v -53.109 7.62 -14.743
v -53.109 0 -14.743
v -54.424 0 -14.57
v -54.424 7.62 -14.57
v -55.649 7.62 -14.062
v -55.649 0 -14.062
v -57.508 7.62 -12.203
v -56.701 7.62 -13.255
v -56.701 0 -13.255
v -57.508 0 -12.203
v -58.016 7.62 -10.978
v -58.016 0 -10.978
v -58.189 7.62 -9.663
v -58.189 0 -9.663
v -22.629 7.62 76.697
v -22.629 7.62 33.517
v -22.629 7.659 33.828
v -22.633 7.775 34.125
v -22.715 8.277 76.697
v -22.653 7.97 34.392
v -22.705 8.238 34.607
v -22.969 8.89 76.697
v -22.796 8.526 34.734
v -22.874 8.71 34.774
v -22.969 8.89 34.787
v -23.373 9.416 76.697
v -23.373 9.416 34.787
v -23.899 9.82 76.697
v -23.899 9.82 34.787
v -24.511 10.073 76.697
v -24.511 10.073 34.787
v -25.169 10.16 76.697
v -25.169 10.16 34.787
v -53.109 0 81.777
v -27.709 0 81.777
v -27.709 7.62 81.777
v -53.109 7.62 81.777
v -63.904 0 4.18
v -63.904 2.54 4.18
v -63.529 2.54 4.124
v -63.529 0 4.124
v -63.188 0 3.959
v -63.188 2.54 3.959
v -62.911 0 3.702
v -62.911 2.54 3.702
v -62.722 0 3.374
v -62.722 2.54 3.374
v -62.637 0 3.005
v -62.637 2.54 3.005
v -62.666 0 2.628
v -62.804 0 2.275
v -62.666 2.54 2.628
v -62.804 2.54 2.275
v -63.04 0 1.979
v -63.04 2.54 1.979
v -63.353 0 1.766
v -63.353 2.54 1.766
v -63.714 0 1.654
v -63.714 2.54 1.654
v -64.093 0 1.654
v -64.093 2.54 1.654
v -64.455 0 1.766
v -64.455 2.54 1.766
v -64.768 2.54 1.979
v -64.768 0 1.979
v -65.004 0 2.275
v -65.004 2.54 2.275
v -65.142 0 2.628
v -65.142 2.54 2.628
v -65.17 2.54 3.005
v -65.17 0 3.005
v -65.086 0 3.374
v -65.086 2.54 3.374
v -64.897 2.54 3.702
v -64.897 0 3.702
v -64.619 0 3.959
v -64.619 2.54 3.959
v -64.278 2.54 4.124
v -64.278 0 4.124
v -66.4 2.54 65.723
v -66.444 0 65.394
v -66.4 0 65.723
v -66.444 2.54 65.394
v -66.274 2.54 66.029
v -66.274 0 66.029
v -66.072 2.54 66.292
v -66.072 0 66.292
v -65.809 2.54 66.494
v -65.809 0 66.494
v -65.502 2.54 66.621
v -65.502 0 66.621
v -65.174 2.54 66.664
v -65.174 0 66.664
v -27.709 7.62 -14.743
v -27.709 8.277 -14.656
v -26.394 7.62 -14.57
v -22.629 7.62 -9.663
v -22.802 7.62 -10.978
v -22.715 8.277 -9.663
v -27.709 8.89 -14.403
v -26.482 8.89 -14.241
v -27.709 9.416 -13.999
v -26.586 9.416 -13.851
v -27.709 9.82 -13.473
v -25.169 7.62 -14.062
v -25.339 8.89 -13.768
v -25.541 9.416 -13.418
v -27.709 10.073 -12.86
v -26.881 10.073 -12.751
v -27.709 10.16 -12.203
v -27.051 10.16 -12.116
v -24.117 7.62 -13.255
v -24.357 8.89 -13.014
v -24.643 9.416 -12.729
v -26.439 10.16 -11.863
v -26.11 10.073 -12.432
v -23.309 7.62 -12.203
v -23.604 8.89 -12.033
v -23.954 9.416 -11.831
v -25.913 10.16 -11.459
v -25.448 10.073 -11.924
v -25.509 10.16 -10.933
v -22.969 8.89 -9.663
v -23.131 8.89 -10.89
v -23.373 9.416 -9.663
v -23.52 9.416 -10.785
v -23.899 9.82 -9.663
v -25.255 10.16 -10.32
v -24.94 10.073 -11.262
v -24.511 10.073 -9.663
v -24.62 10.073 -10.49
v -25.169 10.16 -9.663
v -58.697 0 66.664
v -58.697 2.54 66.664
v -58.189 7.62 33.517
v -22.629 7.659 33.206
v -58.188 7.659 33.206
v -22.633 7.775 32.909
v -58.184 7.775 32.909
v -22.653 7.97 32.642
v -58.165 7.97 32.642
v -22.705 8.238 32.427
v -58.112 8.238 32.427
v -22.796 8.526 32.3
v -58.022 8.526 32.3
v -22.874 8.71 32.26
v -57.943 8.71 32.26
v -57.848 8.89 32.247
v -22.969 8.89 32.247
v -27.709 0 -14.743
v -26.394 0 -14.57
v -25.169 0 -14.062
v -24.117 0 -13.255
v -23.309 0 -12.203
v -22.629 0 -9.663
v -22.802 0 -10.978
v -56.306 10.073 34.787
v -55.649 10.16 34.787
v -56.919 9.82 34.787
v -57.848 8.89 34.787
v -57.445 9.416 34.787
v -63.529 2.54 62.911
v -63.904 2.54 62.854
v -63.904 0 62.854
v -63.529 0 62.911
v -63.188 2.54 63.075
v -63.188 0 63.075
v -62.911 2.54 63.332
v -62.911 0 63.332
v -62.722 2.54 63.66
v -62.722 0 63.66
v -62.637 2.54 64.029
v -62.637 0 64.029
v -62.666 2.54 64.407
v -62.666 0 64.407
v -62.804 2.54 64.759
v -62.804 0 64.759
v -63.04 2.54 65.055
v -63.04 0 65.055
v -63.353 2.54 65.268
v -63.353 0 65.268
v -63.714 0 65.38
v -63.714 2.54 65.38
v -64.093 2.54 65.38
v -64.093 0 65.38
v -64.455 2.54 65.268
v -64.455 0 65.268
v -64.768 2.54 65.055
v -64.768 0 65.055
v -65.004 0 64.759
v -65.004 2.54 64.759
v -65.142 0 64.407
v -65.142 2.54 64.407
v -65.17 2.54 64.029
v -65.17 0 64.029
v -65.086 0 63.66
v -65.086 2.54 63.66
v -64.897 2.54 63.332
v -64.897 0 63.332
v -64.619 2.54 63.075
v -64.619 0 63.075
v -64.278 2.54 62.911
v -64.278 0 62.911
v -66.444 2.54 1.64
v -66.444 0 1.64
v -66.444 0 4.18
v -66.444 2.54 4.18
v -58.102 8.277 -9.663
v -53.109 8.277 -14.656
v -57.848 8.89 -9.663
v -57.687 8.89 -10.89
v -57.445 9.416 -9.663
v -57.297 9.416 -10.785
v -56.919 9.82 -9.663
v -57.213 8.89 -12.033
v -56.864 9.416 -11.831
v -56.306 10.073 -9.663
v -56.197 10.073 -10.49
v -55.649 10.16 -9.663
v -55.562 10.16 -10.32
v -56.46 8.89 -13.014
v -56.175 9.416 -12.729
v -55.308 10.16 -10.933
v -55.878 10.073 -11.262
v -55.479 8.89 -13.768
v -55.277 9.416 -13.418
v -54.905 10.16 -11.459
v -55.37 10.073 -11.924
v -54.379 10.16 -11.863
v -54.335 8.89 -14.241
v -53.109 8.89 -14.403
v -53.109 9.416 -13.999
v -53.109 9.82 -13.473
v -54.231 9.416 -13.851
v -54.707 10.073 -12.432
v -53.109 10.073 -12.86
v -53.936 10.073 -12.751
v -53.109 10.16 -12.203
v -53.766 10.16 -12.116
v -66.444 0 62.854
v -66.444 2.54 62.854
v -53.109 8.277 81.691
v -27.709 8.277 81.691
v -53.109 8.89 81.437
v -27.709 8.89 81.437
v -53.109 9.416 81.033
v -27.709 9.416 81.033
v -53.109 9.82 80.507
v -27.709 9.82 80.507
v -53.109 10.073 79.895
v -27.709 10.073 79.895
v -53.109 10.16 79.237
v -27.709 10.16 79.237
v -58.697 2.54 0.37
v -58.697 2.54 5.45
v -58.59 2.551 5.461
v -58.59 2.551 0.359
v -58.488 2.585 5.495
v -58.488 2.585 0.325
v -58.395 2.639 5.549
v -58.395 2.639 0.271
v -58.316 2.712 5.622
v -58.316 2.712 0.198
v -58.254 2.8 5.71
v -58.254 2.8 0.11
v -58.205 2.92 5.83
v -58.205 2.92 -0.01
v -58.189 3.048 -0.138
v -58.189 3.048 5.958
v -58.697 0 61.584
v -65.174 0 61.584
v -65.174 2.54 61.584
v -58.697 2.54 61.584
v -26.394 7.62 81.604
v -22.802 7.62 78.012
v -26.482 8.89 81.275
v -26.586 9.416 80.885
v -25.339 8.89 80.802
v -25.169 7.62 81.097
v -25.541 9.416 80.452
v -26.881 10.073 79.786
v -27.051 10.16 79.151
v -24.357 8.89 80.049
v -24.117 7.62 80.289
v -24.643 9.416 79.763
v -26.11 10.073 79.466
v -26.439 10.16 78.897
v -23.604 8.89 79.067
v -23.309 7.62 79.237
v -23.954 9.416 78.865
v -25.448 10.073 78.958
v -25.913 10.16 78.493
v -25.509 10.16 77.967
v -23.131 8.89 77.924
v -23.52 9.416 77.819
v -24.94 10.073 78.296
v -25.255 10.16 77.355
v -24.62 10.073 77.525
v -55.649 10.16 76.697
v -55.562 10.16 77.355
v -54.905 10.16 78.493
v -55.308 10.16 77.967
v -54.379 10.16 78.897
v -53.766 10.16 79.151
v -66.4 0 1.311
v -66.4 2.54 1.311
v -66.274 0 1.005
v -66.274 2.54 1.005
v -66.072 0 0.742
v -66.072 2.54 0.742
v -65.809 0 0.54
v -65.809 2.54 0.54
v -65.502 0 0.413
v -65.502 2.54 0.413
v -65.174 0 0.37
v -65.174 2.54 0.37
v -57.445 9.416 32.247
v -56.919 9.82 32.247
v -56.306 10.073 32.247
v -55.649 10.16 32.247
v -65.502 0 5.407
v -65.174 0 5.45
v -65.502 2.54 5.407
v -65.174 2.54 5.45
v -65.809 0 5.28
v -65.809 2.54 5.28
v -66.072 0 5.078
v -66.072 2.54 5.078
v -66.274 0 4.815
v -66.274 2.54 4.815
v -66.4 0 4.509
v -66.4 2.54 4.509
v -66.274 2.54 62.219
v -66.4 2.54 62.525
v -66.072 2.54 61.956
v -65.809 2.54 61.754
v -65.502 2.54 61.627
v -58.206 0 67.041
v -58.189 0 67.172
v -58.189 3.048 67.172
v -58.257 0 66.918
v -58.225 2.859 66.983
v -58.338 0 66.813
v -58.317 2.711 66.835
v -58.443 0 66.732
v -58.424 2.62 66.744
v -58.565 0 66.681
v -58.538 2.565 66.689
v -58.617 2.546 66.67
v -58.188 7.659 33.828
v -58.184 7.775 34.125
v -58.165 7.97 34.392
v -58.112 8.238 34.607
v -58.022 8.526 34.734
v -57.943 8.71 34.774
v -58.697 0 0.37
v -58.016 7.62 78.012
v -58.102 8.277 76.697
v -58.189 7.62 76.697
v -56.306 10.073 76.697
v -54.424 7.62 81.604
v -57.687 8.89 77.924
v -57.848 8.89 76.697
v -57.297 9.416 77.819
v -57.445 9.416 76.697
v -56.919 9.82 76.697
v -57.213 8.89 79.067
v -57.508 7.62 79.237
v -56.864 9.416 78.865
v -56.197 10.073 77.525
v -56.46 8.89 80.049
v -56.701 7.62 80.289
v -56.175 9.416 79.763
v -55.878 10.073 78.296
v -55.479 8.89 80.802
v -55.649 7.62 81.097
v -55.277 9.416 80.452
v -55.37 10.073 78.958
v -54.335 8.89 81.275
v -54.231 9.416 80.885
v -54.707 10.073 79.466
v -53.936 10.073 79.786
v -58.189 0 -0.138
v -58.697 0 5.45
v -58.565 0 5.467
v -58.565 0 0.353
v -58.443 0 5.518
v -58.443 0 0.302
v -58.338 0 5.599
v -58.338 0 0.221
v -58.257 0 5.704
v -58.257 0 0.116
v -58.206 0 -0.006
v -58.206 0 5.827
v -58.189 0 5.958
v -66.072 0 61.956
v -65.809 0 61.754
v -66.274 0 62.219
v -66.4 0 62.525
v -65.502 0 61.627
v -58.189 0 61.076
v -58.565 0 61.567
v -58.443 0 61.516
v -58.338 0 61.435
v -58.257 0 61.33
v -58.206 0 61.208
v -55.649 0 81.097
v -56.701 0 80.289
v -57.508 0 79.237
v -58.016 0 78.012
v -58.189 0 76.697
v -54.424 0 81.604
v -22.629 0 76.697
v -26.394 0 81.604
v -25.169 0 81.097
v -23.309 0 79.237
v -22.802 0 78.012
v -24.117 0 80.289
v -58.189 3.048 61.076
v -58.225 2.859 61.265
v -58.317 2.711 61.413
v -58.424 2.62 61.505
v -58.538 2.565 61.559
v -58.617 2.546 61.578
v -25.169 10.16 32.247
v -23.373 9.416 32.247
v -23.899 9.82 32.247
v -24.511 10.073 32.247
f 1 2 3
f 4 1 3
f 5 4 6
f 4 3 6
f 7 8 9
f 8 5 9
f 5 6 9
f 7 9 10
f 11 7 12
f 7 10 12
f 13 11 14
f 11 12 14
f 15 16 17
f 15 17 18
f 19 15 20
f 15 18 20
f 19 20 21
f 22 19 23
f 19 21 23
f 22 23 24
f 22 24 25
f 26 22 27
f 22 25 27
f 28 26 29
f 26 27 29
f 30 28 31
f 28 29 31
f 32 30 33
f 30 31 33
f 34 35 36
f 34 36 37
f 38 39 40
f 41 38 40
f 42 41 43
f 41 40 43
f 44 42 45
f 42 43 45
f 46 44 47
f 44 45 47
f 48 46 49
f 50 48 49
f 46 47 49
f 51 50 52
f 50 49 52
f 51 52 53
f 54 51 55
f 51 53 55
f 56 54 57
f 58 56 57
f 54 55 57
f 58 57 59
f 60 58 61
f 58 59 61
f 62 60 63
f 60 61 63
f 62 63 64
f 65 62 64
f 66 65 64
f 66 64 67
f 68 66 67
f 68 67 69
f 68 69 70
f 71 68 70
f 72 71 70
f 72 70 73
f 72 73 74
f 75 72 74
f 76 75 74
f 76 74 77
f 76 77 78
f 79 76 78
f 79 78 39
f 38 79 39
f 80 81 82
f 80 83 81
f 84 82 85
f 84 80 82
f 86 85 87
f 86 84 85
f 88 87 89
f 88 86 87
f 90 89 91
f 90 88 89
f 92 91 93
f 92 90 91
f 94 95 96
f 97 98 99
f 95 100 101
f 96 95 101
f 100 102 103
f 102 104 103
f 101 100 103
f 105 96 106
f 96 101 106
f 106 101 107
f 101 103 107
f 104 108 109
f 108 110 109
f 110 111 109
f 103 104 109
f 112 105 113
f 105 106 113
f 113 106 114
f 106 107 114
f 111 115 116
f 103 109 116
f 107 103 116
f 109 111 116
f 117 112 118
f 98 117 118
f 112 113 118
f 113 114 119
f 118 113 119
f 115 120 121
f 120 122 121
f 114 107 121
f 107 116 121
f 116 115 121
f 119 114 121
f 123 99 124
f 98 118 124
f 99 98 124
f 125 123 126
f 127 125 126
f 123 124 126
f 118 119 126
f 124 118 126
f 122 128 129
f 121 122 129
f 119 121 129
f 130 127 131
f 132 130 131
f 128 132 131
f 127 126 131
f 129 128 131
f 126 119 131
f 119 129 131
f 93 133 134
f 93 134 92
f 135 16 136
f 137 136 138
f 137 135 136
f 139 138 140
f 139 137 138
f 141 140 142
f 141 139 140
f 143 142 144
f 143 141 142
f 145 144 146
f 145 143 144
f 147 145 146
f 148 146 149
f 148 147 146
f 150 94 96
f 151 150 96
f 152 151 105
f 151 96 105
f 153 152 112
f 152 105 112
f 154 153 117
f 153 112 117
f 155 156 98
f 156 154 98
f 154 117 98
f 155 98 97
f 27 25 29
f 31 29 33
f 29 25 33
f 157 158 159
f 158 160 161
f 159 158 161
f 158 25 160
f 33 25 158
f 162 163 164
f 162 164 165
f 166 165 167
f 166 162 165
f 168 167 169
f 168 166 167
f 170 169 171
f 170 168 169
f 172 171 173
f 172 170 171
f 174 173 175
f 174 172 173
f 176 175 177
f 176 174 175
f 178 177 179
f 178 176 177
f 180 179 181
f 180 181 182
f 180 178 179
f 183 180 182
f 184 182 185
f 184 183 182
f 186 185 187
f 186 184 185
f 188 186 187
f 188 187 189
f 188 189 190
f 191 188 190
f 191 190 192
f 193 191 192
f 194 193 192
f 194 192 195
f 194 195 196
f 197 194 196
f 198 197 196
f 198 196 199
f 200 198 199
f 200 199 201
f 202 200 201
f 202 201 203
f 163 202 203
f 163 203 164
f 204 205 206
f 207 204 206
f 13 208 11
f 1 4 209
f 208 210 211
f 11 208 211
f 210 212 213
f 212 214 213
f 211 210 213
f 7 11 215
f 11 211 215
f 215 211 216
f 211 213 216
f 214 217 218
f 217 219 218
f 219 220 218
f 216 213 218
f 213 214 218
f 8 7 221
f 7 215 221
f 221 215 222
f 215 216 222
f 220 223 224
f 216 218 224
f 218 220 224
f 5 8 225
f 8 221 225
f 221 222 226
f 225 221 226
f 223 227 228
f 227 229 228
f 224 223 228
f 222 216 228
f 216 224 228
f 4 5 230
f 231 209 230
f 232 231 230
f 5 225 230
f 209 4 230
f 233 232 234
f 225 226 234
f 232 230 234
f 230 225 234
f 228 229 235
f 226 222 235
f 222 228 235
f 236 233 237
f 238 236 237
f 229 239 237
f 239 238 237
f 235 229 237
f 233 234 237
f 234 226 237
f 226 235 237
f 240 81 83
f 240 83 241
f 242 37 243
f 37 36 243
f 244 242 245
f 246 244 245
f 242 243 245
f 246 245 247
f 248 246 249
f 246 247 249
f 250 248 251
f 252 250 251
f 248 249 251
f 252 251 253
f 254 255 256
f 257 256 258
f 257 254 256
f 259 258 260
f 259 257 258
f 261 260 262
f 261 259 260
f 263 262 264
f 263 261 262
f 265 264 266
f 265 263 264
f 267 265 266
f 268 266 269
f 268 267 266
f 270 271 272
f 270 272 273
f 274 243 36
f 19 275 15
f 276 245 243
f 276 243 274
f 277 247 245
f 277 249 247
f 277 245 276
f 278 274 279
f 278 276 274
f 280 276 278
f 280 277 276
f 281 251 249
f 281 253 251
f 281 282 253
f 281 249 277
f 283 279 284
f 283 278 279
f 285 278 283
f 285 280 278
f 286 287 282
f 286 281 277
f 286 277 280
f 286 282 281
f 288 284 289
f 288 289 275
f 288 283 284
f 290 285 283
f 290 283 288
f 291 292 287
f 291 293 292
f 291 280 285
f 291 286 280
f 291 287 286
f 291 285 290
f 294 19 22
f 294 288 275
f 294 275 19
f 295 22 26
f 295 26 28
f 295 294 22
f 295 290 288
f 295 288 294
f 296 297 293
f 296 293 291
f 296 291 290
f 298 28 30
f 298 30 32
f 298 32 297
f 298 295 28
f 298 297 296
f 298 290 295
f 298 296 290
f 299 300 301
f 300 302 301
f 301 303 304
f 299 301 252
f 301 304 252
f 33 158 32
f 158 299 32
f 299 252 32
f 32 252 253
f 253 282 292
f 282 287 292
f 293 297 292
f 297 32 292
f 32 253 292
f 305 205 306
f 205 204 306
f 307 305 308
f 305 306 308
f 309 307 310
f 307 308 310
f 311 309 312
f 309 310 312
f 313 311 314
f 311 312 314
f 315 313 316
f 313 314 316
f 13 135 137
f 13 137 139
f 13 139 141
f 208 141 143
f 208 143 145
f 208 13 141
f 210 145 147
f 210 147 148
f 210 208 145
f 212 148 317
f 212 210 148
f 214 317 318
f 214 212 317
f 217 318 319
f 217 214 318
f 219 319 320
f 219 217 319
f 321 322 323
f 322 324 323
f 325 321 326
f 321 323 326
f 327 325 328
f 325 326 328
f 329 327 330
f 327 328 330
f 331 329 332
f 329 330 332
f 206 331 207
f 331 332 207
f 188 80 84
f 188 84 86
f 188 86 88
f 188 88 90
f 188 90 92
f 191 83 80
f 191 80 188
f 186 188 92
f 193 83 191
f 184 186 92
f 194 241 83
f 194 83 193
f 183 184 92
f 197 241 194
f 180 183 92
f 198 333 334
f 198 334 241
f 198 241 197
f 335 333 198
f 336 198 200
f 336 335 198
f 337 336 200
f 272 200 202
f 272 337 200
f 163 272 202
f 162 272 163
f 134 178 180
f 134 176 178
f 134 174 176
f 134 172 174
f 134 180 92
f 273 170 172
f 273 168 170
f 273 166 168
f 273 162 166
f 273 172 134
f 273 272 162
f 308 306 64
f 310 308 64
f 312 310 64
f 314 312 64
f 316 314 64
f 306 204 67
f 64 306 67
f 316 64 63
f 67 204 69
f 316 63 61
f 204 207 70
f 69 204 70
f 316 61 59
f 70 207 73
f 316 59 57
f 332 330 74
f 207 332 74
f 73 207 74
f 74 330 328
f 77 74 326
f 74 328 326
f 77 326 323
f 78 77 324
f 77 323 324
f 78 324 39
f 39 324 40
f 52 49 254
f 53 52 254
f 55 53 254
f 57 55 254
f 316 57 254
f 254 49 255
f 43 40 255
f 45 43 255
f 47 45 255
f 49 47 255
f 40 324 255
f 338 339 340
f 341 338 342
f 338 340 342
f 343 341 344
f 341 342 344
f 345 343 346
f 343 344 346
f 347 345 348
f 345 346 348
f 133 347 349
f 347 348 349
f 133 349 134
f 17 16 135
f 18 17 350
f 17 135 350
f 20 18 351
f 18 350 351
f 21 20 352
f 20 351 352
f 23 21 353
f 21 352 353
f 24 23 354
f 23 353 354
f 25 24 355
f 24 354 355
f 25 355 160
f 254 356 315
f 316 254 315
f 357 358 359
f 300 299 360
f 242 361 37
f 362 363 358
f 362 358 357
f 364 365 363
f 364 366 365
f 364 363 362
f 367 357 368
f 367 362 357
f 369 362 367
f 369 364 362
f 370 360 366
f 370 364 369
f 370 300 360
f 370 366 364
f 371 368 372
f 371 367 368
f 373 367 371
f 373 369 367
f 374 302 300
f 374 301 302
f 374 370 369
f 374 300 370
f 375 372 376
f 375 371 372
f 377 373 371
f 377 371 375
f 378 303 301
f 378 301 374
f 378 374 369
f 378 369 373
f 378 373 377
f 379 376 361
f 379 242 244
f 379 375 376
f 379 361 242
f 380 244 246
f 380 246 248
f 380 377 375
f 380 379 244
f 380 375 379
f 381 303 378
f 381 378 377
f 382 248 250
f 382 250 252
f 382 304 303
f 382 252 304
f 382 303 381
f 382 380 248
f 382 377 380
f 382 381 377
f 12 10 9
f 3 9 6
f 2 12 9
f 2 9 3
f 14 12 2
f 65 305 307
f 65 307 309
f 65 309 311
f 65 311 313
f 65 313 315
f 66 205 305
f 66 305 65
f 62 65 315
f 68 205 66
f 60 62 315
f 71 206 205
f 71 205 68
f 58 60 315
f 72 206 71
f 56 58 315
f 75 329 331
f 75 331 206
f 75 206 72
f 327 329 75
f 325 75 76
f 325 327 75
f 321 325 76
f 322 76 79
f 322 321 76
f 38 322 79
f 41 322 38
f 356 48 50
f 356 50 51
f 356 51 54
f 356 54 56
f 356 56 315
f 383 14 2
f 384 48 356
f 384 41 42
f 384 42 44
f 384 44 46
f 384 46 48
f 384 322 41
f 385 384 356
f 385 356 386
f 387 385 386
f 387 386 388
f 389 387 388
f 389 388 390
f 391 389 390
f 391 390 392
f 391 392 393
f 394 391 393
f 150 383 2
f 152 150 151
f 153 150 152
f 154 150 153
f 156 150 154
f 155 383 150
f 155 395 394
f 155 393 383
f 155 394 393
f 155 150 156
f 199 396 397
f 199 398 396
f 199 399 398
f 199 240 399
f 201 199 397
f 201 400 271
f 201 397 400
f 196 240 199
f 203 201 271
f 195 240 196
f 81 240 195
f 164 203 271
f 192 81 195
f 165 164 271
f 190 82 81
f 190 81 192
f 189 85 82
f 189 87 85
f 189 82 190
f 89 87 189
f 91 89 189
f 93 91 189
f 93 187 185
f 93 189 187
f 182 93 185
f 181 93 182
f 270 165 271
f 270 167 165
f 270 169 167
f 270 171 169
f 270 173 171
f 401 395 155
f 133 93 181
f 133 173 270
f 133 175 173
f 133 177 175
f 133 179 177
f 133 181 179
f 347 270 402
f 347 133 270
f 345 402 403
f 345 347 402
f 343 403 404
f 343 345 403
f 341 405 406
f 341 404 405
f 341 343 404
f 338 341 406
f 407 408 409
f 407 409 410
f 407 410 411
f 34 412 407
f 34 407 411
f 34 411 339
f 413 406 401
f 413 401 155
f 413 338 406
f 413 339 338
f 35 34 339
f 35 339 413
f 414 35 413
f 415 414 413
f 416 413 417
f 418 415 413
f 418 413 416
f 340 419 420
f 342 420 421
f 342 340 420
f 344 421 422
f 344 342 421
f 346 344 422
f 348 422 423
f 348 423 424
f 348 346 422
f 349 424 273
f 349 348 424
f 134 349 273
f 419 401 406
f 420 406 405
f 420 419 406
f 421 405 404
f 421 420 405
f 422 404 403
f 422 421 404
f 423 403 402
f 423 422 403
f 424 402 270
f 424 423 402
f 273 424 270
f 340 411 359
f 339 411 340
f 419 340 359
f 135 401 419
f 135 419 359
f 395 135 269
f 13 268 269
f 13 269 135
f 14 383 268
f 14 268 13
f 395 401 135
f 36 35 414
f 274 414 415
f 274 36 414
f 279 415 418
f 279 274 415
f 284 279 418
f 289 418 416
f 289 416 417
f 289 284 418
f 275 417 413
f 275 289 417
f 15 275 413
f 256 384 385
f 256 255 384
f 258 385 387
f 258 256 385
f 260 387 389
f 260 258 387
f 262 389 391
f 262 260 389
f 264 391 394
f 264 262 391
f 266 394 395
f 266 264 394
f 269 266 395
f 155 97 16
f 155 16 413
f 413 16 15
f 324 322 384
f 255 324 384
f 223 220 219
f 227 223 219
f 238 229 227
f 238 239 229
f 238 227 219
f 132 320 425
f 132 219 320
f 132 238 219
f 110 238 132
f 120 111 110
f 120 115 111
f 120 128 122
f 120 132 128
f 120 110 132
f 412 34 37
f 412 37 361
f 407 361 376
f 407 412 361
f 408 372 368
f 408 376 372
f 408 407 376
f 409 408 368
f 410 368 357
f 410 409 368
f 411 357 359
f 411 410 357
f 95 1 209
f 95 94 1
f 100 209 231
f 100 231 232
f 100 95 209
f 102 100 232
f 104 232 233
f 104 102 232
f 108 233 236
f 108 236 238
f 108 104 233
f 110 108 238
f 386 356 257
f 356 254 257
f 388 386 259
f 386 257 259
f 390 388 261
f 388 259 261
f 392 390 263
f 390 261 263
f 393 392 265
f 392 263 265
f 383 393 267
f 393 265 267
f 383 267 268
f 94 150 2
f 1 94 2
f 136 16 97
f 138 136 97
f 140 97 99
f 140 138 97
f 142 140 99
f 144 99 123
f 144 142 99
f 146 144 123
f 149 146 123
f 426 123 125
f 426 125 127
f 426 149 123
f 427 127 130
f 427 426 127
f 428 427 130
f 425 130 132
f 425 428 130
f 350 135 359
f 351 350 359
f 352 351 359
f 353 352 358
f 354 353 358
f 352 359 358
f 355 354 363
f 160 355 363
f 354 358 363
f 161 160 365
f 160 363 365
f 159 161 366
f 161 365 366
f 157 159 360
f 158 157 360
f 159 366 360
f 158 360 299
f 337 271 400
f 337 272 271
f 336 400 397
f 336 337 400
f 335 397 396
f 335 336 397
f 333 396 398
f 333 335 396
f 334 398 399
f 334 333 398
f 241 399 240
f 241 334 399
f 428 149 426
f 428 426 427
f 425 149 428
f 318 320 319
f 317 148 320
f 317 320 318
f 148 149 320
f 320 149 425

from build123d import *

# Parameters (mm, degrees)
BOSS_EXTRUDE1_DEPTH  = 10.16
SKETCH3_R            = 1.27
CUT_EXTRUDE1_DEPTH   = 10.16
SKETCH4_W            = 8.255
SKETCH4_H            = 7.62
CUT_EXTRUDE2_DEPTH   = 10.16
FILLET2_R            = 0.508
FILLET3_R            = 1.27
SKETCH6_W            = 84.495652993
SKETCH6_H            = 50.182540269
CUT_EXTRUDE3_DEPTH   = 27.94
CUT_EXTRUDE4_DEPTH   = 27.94
CUT_EXTRUDE5_DEPTH   = 40.132
FILLET4_R            = 2.54
FILLET2_OF_MIRROR1_R = 0.508
FILLET3_OF_MIRROR1_R = 1.27
FILLET4_OF_MIRROR1_R = 2.54


with BuildPart() as part:
    # Sketch1 → Boss-Extrude1 (new body)
    with BuildSketch(Plane(origin=(0, 0, 0), x_dir=(1, 0, 0), z_dir=(0, 1, 0))):
        with BuildLine():
            Line((-58.188733064, -33.517116066), (5.311266936, -33.517116066))
            Line((5.311266936, -33.517116066), (5.311266936, 14.742883934))
            Line((5.311266936, 14.742883934), (-53.108733064, 14.742883934))
            ThreePointArc((-53.108733064, 14.742883934), (-56.700835512, 13.254986382), (-58.188733064, 9.662883934))
            Line((-58.188733064, 9.662883934), (-58.188733064, -0.370116066))
            Line((-58.188733064, -0.370116066), (-66.443733064, -0.370116066))
            Line((-66.443733064, -0.370116066), (-66.443733064, -5.450116066))
            Line((-66.443733064, -5.450116066), (-58.188733064, -5.450116066))
            Line((-58.188733064, -5.450116066), (-58.188733064, -33.517116066))
        make_face()
    boss_extrude1 = extrude(amount=BOSS_EXTRUDE1_DEPTH)

    # Sketch3 → Cut-Extrude1 (cut)
    with BuildSketch(Plane(origin=(0, 10.16, 0), x_dir=(1, 0, 0), z_dir=(0, 1, 0))):
        with Locations(Location((-63.903733064, -2.910116066, 0), (0, 0, 270))):
            Circle(SKETCH3_R)
    cut_extrude1 = extrude(amount=-CUT_EXTRUDE1_DEPTH, mode=Mode.SUBTRACT)

    # Sketch4 → Cut-Extrude2 (cut)
    with BuildSketch(Plane.XY.offset(5.450116066)):
        with Locations((-62.316233064, 6.35)):
            Rectangle(SKETCH4_W, SKETCH4_H)
    cut_extrude2 = extrude(amount=-CUT_EXTRUDE2_DEPTH, mode=Mode.SUBTRACT)

    # Fillet2
    fillet2_edges = [part.edges().sort_by_distance(p)[0] for p in [
        (-58.188733064, 1.27, 5.450116066),
        (-58.188733064, 1.27, 0.370116066),
        (-58.188733064, 2.54, 2.910116066),
    ]]
    fillet(fillet2_edges, radius=FILLET2_R)

    # Fillet3
    fillet3_edges = [part.edges().sort_by_distance(p)[0] for p in [
        (-66.443733064, 1.27, 5.450116066),
        (-66.443733064, 1.27, 0.370116066),
    ]]
    fillet(fillet3_edges, radius=FILLET3_R)

    # Sketch6 → Cut-Extrude3 (cut)
    with BuildSketch(Plane(origin=(5.311266936, 0, 0), x_dir=(0, 0, -1), z_dir=(1, 0, 0))):
        with Locations((-10.301713583, -2.397336113)):
            Rectangle(SKETCH6_W, SKETCH6_H)
    cut_extrude3 = extrude(amount=-CUT_EXTRUDE3_DEPTH, mode=Mode.SUBTRACT)

    # Sketch7 → Cut-Extrude4 (cut)
    with BuildSketch(Plane(origin=(0, 10.16, 0), x_dir=(1, 0, 0), z_dir=(0, 1, 0))):
        with BuildLine():
            Line((-22.628733064, 14.742883934), (-27.708733064, 14.742883934))
            ThreePointArc((-27.708733064, 14.742883934), (-24.116630616, 13.254986382), (-22.628733064, 9.662883934))
            Line((-22.628733064, 9.662883934), (-22.628733064, 14.742883934))
        make_face()
    cut_extrude4 = extrude(amount=-CUT_EXTRUDE4_DEPTH, mode=Mode.SUBTRACT)

    # Sketch8 → Cut-Extrude5 (cut)
    with BuildSketch(Plane.ZY.offset(58.188733064)):
        with BuildLine():
            Line((33.517116066, 10.16), (33.517116066, 8.89))
            Line((33.517116066, 8.89), (33.517116066, 7.62))
            ThreePointArc((33.517116066, 7.62), (32.619090454, 7.991974388), (32.247116066, 8.89))
            Line((32.247116066, 8.89), (32.247116066, 10.16))
            Line((32.247116066, 10.16), (33.517116066, 10.16))
        make_face()
    cut_extrude5 = extrude(amount=-CUT_EXTRUDE5_DEPTH, mode=Mode.SUBTRACT)

    # Fillet4
    fillet4_edges = [part.edges().sort_by_distance(p)[0] for p in [
        (-24.116630616, 10.16, -13.254986382),
        (-22.628733064, 10.16, 11.292116066),
        (-40.408733064, 10.16, -14.742883934),
        (-56.700835512, 10.16, -13.254986382),
        (-58.188733064, 10.16, 11.292116066),
    ]]
    fillet(fillet4_edges, radius=FILLET4_R)


with BuildPart() as mirror1_1:
    # Mirror1: Boss-Extrude1 across plane
    add(boss_extrude1.mirror(Plane(origin=(-58.188733064, 10.16, 33.517116066), x_dir=(1, 0, 0), z_dir=(0, 0, -1))))

    # Mirror1 2: Cut-Extrude1, Cut-Extrude2, Cut-Extrude3, Cut-Extrude4, Cut-Extrude5 across plane
    add(cut_extrude1.mirror(Plane(origin=(-58.188733064, 10.16, 33.517116066), x_dir=(1, 0, 0), z_dir=(0, 0, -1))), mode=Mode.SUBTRACT)
    add(cut_extrude2.mirror(Plane(origin=(-58.188733064, 10.16, 33.517116066), x_dir=(1, 0, 0), z_dir=(0, 0, -1))), mode=Mode.SUBTRACT)
    add(cut_extrude3.mirror(Plane(origin=(-58.188733064, 10.16, 33.517116066), x_dir=(1, 0, 0), z_dir=(0, 0, -1))), mode=Mode.SUBTRACT)
    add(cut_extrude4.mirror(Plane(origin=(-58.188733064, 10.16, 33.517116066), x_dir=(1, 0, 0), z_dir=(0, 0, -1))), mode=Mode.SUBTRACT)
    add(cut_extrude5.mirror(Plane(origin=(-58.188733064, 10.16, 33.517116066), x_dir=(1, 0, 0), z_dir=(0, 0, -1))), mode=Mode.SUBTRACT)

    # Fillet2 of Mirror1
    fillet2_of_mirror1_edges = [mirror1_1.edges().sort_by_distance(p)[0] for p in [
        (-58.188733064, 1.27, 61.584116066),
        (-58.188733064, 1.27, 66.664116066),
        (-58.188733064, 2.54, 64.124116066),
    ]]
    fillet(fillet2_of_mirror1_edges, radius=FILLET2_OF_MIRROR1_R)

    # Fillet3 of Mirror1
    fillet3_of_mirror1_edges = [mirror1_1.edges().sort_by_distance(p)[0] for p in [
        (-66.443733064, 1.27, 61.584116066),
        (-66.443733064, 1.27, 66.664116066),
    ]]
    fillet(fillet3_of_mirror1_edges, radius=FILLET3_OF_MIRROR1_R)

    # Fillet4 of Mirror1
    fillet4_of_mirror1_edges = [mirror1_1.edges().sort_by_distance(p)[0] for p in [
        (-24.116630616, 10.16, 80.289218515),
        (-22.628733064, 10.16, 55.742116066),
        (-40.408733064, 10.16, 81.777116066),
        (-56.700835512, 10.16, 80.289218515),
        (-58.188733064, 10.16, 55.742116066),
    ]]
    fillet(fillet4_of_mirror1_edges, radius=FILLET4_OF_MIRROR1_R)


with BuildPart() as part_1:
    add(part.part)

    # Mirror1 united with what the copies touc: union Mirror1_1
    add(mirror1_1.part)


solid = part_1.part
